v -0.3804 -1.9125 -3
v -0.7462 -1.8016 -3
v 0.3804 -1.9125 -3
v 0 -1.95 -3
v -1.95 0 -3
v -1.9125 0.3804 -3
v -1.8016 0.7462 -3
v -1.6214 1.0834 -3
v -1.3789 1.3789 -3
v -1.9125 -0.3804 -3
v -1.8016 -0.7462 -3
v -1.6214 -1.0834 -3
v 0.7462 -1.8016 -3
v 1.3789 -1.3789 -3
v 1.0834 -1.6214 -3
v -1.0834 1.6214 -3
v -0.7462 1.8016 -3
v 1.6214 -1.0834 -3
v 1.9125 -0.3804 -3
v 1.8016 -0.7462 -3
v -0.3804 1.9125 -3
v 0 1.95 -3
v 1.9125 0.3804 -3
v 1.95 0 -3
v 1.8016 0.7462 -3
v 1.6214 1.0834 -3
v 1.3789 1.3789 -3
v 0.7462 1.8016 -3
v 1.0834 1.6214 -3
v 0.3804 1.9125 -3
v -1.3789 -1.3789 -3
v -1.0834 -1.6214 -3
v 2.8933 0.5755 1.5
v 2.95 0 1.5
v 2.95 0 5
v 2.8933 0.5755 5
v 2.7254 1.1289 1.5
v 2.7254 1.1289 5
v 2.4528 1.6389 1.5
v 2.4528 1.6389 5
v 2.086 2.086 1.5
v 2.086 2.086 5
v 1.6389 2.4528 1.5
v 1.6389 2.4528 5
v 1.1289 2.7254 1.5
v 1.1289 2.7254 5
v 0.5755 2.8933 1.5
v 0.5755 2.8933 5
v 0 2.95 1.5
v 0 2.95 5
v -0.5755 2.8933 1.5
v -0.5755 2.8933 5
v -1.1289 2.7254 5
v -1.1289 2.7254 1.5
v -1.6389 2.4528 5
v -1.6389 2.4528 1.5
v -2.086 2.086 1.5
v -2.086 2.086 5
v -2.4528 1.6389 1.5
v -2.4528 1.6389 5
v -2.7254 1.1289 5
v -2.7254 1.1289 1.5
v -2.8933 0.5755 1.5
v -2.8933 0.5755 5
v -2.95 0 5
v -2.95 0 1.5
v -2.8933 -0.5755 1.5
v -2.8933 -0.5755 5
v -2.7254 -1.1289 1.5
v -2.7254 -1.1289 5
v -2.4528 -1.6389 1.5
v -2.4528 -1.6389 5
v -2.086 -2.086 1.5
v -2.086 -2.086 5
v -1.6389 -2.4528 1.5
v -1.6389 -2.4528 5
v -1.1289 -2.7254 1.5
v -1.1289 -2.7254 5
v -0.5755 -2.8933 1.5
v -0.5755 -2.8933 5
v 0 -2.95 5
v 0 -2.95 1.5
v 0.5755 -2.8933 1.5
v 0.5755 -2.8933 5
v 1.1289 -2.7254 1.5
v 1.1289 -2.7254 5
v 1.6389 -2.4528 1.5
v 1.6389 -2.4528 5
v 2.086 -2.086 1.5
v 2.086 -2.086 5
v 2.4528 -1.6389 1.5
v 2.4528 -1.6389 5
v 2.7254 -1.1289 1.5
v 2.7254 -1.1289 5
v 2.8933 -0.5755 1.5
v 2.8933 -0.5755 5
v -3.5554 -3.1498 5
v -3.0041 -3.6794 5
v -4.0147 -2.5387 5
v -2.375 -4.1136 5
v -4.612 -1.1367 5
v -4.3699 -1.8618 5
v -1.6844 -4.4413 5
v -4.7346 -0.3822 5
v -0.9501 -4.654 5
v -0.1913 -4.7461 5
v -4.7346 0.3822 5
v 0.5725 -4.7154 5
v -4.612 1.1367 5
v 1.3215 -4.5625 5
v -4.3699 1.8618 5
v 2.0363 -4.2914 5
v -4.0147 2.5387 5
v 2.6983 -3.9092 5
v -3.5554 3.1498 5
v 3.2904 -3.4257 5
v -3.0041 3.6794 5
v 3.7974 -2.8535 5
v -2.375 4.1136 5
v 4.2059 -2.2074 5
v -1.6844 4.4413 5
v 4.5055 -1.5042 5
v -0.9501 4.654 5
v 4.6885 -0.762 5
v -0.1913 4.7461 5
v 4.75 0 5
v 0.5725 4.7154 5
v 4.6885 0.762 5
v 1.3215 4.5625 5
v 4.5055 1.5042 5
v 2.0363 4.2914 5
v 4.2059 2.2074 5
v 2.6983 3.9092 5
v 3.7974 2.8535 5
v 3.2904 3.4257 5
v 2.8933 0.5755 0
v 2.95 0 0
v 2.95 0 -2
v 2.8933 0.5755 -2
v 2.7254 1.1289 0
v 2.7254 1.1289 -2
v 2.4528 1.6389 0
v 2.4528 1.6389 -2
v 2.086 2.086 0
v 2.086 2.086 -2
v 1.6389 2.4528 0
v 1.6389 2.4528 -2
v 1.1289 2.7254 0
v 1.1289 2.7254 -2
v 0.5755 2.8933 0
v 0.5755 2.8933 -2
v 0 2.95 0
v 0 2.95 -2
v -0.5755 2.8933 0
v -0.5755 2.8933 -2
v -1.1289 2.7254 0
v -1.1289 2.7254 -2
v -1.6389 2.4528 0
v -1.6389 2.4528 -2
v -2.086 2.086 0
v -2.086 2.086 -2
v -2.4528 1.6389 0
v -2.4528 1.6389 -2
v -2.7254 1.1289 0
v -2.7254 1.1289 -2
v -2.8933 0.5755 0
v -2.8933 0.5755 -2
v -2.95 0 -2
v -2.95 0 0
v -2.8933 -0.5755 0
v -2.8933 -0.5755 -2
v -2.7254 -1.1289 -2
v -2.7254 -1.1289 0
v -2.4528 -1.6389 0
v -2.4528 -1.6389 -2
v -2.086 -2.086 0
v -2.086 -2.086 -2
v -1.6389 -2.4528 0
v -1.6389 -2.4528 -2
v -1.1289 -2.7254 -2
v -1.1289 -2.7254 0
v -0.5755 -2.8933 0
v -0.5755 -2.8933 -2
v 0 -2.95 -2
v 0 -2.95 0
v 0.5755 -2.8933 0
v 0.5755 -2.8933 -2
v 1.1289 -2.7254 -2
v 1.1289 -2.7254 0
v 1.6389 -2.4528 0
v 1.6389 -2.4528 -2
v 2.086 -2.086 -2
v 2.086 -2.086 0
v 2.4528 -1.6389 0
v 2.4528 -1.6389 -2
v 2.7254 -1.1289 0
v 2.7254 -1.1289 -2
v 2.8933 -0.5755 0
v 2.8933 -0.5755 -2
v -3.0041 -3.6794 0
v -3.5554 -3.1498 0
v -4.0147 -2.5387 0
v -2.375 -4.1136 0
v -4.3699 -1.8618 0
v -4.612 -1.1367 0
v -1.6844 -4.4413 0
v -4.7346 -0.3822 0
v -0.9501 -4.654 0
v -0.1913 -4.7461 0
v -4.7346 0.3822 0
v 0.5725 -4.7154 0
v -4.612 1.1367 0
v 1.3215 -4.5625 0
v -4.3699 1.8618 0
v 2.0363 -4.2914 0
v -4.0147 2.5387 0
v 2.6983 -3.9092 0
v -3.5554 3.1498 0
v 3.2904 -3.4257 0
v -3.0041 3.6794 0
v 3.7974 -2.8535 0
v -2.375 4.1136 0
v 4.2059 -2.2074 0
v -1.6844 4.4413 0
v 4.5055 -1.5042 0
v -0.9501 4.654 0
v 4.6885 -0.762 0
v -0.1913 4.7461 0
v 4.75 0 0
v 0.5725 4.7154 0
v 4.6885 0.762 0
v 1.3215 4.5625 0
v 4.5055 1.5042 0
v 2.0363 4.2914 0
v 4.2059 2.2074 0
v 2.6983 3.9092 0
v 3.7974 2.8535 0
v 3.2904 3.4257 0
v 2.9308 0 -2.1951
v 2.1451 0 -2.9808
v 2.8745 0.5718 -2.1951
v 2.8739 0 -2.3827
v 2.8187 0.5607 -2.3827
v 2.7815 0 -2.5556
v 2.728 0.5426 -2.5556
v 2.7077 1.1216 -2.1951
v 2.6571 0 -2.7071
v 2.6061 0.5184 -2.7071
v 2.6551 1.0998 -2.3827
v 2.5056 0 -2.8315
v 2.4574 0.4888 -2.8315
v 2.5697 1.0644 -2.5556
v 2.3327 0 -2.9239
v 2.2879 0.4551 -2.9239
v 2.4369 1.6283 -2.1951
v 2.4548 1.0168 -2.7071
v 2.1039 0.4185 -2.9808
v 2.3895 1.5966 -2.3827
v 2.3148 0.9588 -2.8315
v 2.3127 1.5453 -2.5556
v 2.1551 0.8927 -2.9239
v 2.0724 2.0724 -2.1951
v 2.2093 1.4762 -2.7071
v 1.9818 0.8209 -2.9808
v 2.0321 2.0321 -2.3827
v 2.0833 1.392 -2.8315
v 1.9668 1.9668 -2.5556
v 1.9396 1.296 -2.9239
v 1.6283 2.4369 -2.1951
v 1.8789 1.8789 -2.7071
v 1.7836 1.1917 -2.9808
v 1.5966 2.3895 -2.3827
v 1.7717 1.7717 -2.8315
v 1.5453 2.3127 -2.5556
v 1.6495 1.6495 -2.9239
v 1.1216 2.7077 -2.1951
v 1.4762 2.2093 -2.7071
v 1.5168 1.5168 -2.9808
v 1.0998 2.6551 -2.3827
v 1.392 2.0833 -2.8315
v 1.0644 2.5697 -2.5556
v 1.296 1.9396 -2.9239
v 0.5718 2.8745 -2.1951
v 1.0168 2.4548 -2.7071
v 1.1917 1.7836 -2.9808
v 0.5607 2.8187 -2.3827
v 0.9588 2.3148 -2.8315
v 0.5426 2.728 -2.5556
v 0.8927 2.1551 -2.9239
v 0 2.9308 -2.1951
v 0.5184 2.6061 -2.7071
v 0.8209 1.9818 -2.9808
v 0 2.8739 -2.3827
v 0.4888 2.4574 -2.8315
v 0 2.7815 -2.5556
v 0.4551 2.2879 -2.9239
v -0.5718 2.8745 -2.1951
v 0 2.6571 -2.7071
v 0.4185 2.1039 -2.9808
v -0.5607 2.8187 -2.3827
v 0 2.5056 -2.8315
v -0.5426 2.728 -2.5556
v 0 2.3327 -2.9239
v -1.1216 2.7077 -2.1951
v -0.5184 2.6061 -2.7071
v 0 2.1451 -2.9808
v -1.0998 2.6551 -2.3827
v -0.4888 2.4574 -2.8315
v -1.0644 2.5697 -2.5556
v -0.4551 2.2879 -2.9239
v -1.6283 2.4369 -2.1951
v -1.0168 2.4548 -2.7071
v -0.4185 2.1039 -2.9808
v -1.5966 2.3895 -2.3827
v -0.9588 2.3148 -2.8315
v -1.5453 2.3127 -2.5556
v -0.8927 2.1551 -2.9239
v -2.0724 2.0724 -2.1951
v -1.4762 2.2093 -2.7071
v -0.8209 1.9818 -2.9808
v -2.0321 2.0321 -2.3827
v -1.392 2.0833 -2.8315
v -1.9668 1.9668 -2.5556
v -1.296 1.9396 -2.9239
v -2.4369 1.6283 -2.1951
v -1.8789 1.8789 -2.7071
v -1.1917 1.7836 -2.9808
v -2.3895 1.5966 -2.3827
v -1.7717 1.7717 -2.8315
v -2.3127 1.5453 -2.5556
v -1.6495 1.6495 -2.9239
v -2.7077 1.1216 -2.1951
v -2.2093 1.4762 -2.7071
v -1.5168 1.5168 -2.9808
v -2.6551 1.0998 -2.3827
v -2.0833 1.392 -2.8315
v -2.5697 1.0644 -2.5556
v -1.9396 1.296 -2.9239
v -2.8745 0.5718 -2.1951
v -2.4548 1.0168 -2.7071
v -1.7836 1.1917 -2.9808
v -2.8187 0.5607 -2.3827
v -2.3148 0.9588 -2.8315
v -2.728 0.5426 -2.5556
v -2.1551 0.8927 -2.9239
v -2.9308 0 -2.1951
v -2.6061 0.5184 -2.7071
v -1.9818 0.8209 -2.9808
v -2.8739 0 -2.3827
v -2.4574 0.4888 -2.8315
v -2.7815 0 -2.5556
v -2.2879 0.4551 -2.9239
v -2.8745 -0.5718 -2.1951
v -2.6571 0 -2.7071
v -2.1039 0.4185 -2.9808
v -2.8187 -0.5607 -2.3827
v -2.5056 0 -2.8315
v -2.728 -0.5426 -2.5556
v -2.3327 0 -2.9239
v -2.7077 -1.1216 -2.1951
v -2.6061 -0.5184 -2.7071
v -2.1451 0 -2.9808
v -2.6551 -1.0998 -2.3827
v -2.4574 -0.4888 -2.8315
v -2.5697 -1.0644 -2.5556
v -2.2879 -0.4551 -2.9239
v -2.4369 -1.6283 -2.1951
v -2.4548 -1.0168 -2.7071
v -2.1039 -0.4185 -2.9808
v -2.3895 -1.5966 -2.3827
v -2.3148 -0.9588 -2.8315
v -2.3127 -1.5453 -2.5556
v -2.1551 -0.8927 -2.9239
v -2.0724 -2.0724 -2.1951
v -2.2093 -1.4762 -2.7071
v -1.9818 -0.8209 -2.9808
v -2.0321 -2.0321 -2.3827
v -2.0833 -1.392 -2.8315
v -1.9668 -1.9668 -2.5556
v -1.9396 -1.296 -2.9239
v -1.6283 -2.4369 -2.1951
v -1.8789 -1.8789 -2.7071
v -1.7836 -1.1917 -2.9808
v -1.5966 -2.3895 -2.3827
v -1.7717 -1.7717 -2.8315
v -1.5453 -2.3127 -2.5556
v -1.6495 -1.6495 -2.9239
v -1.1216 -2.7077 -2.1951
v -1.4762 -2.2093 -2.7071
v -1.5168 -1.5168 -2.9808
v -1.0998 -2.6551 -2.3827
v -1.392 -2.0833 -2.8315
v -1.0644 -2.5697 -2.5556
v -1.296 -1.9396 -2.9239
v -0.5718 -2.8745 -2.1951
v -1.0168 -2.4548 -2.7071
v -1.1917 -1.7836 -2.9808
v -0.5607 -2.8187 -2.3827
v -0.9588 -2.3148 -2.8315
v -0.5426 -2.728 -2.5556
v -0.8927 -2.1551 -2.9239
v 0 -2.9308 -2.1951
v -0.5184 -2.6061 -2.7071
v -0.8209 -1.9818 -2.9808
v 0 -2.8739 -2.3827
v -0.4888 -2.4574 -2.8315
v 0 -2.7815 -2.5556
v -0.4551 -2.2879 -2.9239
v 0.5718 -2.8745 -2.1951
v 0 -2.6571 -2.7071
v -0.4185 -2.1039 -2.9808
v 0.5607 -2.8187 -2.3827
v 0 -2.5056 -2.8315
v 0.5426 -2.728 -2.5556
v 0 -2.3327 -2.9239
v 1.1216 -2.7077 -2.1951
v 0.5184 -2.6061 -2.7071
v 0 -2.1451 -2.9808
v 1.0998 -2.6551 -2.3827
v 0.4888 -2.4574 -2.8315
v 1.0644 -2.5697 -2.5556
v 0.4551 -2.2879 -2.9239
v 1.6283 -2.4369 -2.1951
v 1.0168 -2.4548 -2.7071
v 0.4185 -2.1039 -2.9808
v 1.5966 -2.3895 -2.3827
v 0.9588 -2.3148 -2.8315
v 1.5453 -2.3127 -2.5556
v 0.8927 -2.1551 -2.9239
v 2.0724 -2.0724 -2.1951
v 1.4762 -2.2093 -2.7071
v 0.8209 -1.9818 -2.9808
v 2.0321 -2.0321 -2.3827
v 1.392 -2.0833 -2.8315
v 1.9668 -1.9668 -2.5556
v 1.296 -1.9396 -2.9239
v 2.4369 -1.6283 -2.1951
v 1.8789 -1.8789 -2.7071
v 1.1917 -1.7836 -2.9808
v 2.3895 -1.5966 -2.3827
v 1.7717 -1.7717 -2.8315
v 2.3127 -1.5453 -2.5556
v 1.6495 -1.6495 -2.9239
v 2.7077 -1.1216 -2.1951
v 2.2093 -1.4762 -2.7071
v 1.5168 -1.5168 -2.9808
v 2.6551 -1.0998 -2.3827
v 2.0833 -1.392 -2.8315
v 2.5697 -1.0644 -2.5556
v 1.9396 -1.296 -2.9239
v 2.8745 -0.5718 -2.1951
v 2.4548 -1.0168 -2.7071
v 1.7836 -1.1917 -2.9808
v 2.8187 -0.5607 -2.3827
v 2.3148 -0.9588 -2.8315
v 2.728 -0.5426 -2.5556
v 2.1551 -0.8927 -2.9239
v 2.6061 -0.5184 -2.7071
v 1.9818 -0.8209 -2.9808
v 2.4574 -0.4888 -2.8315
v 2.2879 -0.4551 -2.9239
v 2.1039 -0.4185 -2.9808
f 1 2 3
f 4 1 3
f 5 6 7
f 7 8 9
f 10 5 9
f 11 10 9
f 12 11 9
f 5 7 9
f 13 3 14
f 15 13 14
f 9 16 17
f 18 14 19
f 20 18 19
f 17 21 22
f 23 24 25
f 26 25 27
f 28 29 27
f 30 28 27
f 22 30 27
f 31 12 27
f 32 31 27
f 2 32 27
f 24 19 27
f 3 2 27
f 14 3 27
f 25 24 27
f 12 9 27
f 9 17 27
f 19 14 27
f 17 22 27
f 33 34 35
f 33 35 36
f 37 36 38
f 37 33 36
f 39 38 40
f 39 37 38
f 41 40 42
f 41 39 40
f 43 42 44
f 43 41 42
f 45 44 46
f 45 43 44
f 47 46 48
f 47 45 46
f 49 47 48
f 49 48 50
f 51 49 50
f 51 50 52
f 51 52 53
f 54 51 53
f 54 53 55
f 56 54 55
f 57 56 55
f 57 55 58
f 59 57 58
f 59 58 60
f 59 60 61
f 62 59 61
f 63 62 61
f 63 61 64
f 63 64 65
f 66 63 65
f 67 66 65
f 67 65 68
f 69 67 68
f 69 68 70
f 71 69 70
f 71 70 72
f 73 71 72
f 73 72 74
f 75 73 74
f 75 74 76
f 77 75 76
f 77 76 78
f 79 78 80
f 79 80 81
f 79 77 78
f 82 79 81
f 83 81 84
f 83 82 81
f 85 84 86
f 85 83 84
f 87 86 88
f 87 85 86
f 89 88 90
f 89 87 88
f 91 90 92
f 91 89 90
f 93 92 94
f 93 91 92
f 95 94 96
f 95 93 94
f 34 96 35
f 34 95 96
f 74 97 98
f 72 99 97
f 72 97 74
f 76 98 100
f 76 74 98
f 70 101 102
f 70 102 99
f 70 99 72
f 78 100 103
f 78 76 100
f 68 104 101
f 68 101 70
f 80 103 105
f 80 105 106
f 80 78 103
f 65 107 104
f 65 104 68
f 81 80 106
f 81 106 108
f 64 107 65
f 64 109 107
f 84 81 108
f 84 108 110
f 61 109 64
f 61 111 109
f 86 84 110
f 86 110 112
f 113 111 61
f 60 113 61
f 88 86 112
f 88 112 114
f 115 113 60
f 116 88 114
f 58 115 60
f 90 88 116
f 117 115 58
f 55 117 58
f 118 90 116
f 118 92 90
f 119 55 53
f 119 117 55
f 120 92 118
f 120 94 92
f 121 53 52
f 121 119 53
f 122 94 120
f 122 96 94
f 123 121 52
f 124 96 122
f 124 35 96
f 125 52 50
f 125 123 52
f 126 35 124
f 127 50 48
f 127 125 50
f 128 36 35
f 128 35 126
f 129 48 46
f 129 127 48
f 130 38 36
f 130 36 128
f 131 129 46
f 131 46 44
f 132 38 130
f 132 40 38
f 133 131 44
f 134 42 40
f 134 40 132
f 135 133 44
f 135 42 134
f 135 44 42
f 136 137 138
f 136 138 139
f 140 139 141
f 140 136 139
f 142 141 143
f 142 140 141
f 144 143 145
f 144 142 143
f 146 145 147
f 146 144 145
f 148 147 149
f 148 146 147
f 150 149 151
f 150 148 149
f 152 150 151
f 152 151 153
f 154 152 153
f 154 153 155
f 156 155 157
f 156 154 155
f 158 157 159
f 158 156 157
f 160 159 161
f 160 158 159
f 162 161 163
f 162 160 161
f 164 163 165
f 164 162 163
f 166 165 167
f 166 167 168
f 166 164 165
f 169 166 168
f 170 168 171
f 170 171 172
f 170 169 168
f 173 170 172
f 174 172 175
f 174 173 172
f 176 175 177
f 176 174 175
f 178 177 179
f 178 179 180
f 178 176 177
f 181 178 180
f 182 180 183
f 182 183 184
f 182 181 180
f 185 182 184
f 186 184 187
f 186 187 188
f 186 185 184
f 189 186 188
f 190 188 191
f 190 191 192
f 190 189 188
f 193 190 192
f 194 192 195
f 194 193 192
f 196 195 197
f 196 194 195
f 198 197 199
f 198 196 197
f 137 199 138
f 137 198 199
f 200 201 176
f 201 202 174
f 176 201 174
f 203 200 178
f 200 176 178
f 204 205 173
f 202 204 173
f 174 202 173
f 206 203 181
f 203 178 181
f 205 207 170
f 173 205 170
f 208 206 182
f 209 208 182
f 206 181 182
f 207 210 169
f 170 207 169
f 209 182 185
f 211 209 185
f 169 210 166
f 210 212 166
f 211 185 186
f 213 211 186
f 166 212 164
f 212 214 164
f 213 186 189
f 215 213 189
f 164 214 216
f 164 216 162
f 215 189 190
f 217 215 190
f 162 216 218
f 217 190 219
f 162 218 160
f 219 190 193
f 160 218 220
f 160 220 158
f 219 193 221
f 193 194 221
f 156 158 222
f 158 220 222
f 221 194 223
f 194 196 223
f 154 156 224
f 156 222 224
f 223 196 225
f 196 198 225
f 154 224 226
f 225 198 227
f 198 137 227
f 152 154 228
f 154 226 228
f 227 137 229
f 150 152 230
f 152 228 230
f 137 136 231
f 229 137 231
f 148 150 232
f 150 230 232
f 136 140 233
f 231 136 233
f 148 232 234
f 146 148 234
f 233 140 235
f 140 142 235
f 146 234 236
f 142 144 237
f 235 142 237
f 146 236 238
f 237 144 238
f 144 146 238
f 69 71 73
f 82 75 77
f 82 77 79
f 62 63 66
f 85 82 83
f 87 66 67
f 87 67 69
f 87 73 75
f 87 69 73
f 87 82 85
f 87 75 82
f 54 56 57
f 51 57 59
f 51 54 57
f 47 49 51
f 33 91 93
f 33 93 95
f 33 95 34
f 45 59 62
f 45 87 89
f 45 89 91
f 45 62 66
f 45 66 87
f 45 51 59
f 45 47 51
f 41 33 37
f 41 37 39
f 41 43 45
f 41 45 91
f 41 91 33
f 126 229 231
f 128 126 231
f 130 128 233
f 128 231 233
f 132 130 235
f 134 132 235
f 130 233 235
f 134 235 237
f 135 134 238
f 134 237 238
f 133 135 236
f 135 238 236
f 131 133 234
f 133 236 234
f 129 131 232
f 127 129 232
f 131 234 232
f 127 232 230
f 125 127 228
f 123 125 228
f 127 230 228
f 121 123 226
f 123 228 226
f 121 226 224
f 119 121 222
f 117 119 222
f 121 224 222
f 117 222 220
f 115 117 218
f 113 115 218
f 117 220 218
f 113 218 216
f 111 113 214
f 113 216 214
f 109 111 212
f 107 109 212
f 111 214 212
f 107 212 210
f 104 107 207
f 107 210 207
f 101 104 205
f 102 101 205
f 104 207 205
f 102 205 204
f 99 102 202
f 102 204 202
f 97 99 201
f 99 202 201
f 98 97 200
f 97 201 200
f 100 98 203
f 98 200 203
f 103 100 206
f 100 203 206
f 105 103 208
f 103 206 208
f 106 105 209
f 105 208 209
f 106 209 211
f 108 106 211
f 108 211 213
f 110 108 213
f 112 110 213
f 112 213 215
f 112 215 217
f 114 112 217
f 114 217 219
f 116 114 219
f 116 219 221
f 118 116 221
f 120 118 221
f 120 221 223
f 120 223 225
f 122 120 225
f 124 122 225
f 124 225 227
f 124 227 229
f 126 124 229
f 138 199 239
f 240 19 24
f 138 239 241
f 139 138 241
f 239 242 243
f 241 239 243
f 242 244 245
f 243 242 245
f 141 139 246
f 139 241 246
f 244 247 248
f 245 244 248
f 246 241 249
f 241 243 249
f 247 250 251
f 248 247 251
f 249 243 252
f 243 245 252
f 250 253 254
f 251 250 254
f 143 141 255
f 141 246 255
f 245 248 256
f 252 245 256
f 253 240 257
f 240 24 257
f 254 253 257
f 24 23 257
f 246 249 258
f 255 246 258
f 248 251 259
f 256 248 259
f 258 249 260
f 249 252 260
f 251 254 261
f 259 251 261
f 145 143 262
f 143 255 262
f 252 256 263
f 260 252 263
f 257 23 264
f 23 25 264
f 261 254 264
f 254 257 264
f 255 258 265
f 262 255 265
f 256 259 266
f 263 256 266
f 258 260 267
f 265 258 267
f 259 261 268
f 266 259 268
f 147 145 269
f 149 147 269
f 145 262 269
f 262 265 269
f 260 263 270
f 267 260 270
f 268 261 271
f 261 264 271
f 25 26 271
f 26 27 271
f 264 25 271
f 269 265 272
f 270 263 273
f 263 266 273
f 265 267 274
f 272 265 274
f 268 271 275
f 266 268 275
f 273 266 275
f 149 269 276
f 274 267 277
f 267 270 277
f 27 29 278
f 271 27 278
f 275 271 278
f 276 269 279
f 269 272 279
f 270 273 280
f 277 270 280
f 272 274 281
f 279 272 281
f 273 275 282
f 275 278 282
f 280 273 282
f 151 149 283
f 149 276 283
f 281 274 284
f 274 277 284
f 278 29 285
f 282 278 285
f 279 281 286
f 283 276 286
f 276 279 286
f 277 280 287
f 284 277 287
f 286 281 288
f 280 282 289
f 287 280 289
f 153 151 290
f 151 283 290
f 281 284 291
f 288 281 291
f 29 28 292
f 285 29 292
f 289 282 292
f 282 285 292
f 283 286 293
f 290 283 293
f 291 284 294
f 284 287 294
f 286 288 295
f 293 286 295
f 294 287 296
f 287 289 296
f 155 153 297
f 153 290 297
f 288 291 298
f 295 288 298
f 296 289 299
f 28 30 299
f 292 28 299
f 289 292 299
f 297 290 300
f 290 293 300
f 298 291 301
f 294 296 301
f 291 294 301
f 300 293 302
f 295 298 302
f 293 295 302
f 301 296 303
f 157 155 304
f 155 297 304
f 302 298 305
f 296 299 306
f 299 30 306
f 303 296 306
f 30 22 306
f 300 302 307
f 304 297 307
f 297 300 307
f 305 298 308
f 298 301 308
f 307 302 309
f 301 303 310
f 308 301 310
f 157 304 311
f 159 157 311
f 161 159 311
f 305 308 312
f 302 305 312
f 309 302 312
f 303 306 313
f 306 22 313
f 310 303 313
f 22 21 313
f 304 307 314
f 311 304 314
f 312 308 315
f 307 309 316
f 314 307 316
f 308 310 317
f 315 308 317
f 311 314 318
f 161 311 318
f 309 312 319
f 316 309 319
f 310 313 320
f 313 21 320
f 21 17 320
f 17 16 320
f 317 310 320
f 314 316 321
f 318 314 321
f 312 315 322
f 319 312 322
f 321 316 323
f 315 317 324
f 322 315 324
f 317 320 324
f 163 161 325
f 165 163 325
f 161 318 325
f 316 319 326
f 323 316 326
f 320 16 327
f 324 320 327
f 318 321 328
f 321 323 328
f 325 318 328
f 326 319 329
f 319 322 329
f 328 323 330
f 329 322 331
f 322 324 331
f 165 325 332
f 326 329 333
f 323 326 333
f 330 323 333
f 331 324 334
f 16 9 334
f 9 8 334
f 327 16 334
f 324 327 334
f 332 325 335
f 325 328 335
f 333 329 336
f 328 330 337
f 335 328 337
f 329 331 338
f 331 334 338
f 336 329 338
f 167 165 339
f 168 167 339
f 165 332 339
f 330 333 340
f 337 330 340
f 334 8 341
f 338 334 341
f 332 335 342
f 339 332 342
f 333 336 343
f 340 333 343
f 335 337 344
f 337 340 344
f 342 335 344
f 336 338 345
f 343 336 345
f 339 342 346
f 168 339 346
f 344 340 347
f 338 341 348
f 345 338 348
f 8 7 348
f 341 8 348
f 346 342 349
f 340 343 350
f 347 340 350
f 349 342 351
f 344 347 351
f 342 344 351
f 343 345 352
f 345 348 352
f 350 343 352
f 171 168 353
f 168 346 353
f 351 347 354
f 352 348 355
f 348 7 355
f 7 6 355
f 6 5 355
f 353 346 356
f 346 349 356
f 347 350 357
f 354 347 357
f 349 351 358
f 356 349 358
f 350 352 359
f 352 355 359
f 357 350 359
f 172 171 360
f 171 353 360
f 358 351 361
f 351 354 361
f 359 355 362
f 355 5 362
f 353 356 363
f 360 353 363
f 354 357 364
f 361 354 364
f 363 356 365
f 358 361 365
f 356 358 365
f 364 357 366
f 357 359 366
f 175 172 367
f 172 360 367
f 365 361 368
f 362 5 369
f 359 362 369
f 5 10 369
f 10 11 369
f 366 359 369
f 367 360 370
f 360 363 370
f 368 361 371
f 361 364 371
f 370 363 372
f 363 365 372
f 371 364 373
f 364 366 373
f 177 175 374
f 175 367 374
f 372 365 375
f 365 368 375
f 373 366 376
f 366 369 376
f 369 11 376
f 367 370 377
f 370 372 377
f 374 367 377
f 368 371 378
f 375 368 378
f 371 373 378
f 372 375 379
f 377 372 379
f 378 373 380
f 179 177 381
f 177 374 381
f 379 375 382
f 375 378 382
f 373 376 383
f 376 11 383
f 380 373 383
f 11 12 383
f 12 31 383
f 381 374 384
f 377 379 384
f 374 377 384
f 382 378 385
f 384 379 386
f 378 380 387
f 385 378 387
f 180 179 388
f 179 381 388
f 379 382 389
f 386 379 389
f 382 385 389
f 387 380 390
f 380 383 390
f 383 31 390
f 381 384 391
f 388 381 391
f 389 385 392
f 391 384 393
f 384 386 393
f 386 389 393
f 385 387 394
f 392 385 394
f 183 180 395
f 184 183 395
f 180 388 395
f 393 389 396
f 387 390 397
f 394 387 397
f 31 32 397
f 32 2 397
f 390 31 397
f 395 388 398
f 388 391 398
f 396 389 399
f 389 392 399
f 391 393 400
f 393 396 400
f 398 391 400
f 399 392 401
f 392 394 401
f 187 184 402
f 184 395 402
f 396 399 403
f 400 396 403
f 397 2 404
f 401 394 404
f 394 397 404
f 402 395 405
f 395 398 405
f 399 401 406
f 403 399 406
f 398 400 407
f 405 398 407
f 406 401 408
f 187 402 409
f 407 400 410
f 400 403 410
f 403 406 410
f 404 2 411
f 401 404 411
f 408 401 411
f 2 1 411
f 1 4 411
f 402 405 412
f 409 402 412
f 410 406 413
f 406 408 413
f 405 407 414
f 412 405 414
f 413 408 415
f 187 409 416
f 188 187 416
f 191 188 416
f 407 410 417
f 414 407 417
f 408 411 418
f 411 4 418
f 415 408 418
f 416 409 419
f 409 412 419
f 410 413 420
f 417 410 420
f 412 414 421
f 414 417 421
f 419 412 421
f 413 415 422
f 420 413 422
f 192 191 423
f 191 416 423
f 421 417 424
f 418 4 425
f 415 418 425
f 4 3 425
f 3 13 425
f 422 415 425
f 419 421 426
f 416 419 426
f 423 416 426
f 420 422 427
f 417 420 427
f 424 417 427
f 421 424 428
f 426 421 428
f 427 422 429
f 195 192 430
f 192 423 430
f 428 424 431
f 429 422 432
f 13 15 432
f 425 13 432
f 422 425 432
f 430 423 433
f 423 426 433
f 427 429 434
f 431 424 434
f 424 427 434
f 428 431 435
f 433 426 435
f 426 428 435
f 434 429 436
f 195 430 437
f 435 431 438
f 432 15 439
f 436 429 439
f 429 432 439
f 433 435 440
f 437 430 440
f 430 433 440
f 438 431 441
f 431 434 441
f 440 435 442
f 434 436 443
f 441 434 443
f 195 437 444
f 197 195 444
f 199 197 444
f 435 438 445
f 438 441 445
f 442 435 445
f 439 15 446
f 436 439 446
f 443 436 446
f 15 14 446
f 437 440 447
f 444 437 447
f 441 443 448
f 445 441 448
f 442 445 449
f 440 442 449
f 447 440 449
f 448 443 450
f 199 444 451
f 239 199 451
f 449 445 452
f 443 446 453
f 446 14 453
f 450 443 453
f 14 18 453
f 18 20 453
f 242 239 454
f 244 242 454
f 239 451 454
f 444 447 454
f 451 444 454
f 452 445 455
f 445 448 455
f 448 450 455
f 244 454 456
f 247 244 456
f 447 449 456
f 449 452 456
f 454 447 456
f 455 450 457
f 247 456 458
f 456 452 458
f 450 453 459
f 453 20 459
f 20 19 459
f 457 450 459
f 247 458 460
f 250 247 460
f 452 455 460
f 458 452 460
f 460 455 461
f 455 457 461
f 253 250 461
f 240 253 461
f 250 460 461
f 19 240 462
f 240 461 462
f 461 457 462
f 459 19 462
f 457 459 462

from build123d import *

# Parameters (mm, degrees)
F0_R          = 4.75
F0_R_2        = 2.95
F1_DEPTH      = 5
F2_DEPTH      = 3
F2_DEPTH_BACK = 1.5
F3_R          = 1


with BuildPart() as f1:
    # F0 (on Top) → F1 (new body)
    with BuildSketch(Plane.XY):
        Circle(F0_R)
        Circle(F0_R_2, mode=Mode.SUBTRACT)
    extrude(amount=F1_DEPTH)

    # F0 (on Top) → F2 (join, two sides)
    with BuildSketch(Plane.XY) as f2_sk:
        Circle(F0_R_2)
    extrude(amount=-F2_DEPTH)
    extrude(f2_sk.sketch, amount=F2_DEPTH_BACK)

    # F3
    f3_edges = [f1.edges().sort_by_distance(p)[0] for p in [
        (-2.95, 0, -3),
    ]]
    fillet(f3_edges, radius=F3_R)


solid = f1.part
